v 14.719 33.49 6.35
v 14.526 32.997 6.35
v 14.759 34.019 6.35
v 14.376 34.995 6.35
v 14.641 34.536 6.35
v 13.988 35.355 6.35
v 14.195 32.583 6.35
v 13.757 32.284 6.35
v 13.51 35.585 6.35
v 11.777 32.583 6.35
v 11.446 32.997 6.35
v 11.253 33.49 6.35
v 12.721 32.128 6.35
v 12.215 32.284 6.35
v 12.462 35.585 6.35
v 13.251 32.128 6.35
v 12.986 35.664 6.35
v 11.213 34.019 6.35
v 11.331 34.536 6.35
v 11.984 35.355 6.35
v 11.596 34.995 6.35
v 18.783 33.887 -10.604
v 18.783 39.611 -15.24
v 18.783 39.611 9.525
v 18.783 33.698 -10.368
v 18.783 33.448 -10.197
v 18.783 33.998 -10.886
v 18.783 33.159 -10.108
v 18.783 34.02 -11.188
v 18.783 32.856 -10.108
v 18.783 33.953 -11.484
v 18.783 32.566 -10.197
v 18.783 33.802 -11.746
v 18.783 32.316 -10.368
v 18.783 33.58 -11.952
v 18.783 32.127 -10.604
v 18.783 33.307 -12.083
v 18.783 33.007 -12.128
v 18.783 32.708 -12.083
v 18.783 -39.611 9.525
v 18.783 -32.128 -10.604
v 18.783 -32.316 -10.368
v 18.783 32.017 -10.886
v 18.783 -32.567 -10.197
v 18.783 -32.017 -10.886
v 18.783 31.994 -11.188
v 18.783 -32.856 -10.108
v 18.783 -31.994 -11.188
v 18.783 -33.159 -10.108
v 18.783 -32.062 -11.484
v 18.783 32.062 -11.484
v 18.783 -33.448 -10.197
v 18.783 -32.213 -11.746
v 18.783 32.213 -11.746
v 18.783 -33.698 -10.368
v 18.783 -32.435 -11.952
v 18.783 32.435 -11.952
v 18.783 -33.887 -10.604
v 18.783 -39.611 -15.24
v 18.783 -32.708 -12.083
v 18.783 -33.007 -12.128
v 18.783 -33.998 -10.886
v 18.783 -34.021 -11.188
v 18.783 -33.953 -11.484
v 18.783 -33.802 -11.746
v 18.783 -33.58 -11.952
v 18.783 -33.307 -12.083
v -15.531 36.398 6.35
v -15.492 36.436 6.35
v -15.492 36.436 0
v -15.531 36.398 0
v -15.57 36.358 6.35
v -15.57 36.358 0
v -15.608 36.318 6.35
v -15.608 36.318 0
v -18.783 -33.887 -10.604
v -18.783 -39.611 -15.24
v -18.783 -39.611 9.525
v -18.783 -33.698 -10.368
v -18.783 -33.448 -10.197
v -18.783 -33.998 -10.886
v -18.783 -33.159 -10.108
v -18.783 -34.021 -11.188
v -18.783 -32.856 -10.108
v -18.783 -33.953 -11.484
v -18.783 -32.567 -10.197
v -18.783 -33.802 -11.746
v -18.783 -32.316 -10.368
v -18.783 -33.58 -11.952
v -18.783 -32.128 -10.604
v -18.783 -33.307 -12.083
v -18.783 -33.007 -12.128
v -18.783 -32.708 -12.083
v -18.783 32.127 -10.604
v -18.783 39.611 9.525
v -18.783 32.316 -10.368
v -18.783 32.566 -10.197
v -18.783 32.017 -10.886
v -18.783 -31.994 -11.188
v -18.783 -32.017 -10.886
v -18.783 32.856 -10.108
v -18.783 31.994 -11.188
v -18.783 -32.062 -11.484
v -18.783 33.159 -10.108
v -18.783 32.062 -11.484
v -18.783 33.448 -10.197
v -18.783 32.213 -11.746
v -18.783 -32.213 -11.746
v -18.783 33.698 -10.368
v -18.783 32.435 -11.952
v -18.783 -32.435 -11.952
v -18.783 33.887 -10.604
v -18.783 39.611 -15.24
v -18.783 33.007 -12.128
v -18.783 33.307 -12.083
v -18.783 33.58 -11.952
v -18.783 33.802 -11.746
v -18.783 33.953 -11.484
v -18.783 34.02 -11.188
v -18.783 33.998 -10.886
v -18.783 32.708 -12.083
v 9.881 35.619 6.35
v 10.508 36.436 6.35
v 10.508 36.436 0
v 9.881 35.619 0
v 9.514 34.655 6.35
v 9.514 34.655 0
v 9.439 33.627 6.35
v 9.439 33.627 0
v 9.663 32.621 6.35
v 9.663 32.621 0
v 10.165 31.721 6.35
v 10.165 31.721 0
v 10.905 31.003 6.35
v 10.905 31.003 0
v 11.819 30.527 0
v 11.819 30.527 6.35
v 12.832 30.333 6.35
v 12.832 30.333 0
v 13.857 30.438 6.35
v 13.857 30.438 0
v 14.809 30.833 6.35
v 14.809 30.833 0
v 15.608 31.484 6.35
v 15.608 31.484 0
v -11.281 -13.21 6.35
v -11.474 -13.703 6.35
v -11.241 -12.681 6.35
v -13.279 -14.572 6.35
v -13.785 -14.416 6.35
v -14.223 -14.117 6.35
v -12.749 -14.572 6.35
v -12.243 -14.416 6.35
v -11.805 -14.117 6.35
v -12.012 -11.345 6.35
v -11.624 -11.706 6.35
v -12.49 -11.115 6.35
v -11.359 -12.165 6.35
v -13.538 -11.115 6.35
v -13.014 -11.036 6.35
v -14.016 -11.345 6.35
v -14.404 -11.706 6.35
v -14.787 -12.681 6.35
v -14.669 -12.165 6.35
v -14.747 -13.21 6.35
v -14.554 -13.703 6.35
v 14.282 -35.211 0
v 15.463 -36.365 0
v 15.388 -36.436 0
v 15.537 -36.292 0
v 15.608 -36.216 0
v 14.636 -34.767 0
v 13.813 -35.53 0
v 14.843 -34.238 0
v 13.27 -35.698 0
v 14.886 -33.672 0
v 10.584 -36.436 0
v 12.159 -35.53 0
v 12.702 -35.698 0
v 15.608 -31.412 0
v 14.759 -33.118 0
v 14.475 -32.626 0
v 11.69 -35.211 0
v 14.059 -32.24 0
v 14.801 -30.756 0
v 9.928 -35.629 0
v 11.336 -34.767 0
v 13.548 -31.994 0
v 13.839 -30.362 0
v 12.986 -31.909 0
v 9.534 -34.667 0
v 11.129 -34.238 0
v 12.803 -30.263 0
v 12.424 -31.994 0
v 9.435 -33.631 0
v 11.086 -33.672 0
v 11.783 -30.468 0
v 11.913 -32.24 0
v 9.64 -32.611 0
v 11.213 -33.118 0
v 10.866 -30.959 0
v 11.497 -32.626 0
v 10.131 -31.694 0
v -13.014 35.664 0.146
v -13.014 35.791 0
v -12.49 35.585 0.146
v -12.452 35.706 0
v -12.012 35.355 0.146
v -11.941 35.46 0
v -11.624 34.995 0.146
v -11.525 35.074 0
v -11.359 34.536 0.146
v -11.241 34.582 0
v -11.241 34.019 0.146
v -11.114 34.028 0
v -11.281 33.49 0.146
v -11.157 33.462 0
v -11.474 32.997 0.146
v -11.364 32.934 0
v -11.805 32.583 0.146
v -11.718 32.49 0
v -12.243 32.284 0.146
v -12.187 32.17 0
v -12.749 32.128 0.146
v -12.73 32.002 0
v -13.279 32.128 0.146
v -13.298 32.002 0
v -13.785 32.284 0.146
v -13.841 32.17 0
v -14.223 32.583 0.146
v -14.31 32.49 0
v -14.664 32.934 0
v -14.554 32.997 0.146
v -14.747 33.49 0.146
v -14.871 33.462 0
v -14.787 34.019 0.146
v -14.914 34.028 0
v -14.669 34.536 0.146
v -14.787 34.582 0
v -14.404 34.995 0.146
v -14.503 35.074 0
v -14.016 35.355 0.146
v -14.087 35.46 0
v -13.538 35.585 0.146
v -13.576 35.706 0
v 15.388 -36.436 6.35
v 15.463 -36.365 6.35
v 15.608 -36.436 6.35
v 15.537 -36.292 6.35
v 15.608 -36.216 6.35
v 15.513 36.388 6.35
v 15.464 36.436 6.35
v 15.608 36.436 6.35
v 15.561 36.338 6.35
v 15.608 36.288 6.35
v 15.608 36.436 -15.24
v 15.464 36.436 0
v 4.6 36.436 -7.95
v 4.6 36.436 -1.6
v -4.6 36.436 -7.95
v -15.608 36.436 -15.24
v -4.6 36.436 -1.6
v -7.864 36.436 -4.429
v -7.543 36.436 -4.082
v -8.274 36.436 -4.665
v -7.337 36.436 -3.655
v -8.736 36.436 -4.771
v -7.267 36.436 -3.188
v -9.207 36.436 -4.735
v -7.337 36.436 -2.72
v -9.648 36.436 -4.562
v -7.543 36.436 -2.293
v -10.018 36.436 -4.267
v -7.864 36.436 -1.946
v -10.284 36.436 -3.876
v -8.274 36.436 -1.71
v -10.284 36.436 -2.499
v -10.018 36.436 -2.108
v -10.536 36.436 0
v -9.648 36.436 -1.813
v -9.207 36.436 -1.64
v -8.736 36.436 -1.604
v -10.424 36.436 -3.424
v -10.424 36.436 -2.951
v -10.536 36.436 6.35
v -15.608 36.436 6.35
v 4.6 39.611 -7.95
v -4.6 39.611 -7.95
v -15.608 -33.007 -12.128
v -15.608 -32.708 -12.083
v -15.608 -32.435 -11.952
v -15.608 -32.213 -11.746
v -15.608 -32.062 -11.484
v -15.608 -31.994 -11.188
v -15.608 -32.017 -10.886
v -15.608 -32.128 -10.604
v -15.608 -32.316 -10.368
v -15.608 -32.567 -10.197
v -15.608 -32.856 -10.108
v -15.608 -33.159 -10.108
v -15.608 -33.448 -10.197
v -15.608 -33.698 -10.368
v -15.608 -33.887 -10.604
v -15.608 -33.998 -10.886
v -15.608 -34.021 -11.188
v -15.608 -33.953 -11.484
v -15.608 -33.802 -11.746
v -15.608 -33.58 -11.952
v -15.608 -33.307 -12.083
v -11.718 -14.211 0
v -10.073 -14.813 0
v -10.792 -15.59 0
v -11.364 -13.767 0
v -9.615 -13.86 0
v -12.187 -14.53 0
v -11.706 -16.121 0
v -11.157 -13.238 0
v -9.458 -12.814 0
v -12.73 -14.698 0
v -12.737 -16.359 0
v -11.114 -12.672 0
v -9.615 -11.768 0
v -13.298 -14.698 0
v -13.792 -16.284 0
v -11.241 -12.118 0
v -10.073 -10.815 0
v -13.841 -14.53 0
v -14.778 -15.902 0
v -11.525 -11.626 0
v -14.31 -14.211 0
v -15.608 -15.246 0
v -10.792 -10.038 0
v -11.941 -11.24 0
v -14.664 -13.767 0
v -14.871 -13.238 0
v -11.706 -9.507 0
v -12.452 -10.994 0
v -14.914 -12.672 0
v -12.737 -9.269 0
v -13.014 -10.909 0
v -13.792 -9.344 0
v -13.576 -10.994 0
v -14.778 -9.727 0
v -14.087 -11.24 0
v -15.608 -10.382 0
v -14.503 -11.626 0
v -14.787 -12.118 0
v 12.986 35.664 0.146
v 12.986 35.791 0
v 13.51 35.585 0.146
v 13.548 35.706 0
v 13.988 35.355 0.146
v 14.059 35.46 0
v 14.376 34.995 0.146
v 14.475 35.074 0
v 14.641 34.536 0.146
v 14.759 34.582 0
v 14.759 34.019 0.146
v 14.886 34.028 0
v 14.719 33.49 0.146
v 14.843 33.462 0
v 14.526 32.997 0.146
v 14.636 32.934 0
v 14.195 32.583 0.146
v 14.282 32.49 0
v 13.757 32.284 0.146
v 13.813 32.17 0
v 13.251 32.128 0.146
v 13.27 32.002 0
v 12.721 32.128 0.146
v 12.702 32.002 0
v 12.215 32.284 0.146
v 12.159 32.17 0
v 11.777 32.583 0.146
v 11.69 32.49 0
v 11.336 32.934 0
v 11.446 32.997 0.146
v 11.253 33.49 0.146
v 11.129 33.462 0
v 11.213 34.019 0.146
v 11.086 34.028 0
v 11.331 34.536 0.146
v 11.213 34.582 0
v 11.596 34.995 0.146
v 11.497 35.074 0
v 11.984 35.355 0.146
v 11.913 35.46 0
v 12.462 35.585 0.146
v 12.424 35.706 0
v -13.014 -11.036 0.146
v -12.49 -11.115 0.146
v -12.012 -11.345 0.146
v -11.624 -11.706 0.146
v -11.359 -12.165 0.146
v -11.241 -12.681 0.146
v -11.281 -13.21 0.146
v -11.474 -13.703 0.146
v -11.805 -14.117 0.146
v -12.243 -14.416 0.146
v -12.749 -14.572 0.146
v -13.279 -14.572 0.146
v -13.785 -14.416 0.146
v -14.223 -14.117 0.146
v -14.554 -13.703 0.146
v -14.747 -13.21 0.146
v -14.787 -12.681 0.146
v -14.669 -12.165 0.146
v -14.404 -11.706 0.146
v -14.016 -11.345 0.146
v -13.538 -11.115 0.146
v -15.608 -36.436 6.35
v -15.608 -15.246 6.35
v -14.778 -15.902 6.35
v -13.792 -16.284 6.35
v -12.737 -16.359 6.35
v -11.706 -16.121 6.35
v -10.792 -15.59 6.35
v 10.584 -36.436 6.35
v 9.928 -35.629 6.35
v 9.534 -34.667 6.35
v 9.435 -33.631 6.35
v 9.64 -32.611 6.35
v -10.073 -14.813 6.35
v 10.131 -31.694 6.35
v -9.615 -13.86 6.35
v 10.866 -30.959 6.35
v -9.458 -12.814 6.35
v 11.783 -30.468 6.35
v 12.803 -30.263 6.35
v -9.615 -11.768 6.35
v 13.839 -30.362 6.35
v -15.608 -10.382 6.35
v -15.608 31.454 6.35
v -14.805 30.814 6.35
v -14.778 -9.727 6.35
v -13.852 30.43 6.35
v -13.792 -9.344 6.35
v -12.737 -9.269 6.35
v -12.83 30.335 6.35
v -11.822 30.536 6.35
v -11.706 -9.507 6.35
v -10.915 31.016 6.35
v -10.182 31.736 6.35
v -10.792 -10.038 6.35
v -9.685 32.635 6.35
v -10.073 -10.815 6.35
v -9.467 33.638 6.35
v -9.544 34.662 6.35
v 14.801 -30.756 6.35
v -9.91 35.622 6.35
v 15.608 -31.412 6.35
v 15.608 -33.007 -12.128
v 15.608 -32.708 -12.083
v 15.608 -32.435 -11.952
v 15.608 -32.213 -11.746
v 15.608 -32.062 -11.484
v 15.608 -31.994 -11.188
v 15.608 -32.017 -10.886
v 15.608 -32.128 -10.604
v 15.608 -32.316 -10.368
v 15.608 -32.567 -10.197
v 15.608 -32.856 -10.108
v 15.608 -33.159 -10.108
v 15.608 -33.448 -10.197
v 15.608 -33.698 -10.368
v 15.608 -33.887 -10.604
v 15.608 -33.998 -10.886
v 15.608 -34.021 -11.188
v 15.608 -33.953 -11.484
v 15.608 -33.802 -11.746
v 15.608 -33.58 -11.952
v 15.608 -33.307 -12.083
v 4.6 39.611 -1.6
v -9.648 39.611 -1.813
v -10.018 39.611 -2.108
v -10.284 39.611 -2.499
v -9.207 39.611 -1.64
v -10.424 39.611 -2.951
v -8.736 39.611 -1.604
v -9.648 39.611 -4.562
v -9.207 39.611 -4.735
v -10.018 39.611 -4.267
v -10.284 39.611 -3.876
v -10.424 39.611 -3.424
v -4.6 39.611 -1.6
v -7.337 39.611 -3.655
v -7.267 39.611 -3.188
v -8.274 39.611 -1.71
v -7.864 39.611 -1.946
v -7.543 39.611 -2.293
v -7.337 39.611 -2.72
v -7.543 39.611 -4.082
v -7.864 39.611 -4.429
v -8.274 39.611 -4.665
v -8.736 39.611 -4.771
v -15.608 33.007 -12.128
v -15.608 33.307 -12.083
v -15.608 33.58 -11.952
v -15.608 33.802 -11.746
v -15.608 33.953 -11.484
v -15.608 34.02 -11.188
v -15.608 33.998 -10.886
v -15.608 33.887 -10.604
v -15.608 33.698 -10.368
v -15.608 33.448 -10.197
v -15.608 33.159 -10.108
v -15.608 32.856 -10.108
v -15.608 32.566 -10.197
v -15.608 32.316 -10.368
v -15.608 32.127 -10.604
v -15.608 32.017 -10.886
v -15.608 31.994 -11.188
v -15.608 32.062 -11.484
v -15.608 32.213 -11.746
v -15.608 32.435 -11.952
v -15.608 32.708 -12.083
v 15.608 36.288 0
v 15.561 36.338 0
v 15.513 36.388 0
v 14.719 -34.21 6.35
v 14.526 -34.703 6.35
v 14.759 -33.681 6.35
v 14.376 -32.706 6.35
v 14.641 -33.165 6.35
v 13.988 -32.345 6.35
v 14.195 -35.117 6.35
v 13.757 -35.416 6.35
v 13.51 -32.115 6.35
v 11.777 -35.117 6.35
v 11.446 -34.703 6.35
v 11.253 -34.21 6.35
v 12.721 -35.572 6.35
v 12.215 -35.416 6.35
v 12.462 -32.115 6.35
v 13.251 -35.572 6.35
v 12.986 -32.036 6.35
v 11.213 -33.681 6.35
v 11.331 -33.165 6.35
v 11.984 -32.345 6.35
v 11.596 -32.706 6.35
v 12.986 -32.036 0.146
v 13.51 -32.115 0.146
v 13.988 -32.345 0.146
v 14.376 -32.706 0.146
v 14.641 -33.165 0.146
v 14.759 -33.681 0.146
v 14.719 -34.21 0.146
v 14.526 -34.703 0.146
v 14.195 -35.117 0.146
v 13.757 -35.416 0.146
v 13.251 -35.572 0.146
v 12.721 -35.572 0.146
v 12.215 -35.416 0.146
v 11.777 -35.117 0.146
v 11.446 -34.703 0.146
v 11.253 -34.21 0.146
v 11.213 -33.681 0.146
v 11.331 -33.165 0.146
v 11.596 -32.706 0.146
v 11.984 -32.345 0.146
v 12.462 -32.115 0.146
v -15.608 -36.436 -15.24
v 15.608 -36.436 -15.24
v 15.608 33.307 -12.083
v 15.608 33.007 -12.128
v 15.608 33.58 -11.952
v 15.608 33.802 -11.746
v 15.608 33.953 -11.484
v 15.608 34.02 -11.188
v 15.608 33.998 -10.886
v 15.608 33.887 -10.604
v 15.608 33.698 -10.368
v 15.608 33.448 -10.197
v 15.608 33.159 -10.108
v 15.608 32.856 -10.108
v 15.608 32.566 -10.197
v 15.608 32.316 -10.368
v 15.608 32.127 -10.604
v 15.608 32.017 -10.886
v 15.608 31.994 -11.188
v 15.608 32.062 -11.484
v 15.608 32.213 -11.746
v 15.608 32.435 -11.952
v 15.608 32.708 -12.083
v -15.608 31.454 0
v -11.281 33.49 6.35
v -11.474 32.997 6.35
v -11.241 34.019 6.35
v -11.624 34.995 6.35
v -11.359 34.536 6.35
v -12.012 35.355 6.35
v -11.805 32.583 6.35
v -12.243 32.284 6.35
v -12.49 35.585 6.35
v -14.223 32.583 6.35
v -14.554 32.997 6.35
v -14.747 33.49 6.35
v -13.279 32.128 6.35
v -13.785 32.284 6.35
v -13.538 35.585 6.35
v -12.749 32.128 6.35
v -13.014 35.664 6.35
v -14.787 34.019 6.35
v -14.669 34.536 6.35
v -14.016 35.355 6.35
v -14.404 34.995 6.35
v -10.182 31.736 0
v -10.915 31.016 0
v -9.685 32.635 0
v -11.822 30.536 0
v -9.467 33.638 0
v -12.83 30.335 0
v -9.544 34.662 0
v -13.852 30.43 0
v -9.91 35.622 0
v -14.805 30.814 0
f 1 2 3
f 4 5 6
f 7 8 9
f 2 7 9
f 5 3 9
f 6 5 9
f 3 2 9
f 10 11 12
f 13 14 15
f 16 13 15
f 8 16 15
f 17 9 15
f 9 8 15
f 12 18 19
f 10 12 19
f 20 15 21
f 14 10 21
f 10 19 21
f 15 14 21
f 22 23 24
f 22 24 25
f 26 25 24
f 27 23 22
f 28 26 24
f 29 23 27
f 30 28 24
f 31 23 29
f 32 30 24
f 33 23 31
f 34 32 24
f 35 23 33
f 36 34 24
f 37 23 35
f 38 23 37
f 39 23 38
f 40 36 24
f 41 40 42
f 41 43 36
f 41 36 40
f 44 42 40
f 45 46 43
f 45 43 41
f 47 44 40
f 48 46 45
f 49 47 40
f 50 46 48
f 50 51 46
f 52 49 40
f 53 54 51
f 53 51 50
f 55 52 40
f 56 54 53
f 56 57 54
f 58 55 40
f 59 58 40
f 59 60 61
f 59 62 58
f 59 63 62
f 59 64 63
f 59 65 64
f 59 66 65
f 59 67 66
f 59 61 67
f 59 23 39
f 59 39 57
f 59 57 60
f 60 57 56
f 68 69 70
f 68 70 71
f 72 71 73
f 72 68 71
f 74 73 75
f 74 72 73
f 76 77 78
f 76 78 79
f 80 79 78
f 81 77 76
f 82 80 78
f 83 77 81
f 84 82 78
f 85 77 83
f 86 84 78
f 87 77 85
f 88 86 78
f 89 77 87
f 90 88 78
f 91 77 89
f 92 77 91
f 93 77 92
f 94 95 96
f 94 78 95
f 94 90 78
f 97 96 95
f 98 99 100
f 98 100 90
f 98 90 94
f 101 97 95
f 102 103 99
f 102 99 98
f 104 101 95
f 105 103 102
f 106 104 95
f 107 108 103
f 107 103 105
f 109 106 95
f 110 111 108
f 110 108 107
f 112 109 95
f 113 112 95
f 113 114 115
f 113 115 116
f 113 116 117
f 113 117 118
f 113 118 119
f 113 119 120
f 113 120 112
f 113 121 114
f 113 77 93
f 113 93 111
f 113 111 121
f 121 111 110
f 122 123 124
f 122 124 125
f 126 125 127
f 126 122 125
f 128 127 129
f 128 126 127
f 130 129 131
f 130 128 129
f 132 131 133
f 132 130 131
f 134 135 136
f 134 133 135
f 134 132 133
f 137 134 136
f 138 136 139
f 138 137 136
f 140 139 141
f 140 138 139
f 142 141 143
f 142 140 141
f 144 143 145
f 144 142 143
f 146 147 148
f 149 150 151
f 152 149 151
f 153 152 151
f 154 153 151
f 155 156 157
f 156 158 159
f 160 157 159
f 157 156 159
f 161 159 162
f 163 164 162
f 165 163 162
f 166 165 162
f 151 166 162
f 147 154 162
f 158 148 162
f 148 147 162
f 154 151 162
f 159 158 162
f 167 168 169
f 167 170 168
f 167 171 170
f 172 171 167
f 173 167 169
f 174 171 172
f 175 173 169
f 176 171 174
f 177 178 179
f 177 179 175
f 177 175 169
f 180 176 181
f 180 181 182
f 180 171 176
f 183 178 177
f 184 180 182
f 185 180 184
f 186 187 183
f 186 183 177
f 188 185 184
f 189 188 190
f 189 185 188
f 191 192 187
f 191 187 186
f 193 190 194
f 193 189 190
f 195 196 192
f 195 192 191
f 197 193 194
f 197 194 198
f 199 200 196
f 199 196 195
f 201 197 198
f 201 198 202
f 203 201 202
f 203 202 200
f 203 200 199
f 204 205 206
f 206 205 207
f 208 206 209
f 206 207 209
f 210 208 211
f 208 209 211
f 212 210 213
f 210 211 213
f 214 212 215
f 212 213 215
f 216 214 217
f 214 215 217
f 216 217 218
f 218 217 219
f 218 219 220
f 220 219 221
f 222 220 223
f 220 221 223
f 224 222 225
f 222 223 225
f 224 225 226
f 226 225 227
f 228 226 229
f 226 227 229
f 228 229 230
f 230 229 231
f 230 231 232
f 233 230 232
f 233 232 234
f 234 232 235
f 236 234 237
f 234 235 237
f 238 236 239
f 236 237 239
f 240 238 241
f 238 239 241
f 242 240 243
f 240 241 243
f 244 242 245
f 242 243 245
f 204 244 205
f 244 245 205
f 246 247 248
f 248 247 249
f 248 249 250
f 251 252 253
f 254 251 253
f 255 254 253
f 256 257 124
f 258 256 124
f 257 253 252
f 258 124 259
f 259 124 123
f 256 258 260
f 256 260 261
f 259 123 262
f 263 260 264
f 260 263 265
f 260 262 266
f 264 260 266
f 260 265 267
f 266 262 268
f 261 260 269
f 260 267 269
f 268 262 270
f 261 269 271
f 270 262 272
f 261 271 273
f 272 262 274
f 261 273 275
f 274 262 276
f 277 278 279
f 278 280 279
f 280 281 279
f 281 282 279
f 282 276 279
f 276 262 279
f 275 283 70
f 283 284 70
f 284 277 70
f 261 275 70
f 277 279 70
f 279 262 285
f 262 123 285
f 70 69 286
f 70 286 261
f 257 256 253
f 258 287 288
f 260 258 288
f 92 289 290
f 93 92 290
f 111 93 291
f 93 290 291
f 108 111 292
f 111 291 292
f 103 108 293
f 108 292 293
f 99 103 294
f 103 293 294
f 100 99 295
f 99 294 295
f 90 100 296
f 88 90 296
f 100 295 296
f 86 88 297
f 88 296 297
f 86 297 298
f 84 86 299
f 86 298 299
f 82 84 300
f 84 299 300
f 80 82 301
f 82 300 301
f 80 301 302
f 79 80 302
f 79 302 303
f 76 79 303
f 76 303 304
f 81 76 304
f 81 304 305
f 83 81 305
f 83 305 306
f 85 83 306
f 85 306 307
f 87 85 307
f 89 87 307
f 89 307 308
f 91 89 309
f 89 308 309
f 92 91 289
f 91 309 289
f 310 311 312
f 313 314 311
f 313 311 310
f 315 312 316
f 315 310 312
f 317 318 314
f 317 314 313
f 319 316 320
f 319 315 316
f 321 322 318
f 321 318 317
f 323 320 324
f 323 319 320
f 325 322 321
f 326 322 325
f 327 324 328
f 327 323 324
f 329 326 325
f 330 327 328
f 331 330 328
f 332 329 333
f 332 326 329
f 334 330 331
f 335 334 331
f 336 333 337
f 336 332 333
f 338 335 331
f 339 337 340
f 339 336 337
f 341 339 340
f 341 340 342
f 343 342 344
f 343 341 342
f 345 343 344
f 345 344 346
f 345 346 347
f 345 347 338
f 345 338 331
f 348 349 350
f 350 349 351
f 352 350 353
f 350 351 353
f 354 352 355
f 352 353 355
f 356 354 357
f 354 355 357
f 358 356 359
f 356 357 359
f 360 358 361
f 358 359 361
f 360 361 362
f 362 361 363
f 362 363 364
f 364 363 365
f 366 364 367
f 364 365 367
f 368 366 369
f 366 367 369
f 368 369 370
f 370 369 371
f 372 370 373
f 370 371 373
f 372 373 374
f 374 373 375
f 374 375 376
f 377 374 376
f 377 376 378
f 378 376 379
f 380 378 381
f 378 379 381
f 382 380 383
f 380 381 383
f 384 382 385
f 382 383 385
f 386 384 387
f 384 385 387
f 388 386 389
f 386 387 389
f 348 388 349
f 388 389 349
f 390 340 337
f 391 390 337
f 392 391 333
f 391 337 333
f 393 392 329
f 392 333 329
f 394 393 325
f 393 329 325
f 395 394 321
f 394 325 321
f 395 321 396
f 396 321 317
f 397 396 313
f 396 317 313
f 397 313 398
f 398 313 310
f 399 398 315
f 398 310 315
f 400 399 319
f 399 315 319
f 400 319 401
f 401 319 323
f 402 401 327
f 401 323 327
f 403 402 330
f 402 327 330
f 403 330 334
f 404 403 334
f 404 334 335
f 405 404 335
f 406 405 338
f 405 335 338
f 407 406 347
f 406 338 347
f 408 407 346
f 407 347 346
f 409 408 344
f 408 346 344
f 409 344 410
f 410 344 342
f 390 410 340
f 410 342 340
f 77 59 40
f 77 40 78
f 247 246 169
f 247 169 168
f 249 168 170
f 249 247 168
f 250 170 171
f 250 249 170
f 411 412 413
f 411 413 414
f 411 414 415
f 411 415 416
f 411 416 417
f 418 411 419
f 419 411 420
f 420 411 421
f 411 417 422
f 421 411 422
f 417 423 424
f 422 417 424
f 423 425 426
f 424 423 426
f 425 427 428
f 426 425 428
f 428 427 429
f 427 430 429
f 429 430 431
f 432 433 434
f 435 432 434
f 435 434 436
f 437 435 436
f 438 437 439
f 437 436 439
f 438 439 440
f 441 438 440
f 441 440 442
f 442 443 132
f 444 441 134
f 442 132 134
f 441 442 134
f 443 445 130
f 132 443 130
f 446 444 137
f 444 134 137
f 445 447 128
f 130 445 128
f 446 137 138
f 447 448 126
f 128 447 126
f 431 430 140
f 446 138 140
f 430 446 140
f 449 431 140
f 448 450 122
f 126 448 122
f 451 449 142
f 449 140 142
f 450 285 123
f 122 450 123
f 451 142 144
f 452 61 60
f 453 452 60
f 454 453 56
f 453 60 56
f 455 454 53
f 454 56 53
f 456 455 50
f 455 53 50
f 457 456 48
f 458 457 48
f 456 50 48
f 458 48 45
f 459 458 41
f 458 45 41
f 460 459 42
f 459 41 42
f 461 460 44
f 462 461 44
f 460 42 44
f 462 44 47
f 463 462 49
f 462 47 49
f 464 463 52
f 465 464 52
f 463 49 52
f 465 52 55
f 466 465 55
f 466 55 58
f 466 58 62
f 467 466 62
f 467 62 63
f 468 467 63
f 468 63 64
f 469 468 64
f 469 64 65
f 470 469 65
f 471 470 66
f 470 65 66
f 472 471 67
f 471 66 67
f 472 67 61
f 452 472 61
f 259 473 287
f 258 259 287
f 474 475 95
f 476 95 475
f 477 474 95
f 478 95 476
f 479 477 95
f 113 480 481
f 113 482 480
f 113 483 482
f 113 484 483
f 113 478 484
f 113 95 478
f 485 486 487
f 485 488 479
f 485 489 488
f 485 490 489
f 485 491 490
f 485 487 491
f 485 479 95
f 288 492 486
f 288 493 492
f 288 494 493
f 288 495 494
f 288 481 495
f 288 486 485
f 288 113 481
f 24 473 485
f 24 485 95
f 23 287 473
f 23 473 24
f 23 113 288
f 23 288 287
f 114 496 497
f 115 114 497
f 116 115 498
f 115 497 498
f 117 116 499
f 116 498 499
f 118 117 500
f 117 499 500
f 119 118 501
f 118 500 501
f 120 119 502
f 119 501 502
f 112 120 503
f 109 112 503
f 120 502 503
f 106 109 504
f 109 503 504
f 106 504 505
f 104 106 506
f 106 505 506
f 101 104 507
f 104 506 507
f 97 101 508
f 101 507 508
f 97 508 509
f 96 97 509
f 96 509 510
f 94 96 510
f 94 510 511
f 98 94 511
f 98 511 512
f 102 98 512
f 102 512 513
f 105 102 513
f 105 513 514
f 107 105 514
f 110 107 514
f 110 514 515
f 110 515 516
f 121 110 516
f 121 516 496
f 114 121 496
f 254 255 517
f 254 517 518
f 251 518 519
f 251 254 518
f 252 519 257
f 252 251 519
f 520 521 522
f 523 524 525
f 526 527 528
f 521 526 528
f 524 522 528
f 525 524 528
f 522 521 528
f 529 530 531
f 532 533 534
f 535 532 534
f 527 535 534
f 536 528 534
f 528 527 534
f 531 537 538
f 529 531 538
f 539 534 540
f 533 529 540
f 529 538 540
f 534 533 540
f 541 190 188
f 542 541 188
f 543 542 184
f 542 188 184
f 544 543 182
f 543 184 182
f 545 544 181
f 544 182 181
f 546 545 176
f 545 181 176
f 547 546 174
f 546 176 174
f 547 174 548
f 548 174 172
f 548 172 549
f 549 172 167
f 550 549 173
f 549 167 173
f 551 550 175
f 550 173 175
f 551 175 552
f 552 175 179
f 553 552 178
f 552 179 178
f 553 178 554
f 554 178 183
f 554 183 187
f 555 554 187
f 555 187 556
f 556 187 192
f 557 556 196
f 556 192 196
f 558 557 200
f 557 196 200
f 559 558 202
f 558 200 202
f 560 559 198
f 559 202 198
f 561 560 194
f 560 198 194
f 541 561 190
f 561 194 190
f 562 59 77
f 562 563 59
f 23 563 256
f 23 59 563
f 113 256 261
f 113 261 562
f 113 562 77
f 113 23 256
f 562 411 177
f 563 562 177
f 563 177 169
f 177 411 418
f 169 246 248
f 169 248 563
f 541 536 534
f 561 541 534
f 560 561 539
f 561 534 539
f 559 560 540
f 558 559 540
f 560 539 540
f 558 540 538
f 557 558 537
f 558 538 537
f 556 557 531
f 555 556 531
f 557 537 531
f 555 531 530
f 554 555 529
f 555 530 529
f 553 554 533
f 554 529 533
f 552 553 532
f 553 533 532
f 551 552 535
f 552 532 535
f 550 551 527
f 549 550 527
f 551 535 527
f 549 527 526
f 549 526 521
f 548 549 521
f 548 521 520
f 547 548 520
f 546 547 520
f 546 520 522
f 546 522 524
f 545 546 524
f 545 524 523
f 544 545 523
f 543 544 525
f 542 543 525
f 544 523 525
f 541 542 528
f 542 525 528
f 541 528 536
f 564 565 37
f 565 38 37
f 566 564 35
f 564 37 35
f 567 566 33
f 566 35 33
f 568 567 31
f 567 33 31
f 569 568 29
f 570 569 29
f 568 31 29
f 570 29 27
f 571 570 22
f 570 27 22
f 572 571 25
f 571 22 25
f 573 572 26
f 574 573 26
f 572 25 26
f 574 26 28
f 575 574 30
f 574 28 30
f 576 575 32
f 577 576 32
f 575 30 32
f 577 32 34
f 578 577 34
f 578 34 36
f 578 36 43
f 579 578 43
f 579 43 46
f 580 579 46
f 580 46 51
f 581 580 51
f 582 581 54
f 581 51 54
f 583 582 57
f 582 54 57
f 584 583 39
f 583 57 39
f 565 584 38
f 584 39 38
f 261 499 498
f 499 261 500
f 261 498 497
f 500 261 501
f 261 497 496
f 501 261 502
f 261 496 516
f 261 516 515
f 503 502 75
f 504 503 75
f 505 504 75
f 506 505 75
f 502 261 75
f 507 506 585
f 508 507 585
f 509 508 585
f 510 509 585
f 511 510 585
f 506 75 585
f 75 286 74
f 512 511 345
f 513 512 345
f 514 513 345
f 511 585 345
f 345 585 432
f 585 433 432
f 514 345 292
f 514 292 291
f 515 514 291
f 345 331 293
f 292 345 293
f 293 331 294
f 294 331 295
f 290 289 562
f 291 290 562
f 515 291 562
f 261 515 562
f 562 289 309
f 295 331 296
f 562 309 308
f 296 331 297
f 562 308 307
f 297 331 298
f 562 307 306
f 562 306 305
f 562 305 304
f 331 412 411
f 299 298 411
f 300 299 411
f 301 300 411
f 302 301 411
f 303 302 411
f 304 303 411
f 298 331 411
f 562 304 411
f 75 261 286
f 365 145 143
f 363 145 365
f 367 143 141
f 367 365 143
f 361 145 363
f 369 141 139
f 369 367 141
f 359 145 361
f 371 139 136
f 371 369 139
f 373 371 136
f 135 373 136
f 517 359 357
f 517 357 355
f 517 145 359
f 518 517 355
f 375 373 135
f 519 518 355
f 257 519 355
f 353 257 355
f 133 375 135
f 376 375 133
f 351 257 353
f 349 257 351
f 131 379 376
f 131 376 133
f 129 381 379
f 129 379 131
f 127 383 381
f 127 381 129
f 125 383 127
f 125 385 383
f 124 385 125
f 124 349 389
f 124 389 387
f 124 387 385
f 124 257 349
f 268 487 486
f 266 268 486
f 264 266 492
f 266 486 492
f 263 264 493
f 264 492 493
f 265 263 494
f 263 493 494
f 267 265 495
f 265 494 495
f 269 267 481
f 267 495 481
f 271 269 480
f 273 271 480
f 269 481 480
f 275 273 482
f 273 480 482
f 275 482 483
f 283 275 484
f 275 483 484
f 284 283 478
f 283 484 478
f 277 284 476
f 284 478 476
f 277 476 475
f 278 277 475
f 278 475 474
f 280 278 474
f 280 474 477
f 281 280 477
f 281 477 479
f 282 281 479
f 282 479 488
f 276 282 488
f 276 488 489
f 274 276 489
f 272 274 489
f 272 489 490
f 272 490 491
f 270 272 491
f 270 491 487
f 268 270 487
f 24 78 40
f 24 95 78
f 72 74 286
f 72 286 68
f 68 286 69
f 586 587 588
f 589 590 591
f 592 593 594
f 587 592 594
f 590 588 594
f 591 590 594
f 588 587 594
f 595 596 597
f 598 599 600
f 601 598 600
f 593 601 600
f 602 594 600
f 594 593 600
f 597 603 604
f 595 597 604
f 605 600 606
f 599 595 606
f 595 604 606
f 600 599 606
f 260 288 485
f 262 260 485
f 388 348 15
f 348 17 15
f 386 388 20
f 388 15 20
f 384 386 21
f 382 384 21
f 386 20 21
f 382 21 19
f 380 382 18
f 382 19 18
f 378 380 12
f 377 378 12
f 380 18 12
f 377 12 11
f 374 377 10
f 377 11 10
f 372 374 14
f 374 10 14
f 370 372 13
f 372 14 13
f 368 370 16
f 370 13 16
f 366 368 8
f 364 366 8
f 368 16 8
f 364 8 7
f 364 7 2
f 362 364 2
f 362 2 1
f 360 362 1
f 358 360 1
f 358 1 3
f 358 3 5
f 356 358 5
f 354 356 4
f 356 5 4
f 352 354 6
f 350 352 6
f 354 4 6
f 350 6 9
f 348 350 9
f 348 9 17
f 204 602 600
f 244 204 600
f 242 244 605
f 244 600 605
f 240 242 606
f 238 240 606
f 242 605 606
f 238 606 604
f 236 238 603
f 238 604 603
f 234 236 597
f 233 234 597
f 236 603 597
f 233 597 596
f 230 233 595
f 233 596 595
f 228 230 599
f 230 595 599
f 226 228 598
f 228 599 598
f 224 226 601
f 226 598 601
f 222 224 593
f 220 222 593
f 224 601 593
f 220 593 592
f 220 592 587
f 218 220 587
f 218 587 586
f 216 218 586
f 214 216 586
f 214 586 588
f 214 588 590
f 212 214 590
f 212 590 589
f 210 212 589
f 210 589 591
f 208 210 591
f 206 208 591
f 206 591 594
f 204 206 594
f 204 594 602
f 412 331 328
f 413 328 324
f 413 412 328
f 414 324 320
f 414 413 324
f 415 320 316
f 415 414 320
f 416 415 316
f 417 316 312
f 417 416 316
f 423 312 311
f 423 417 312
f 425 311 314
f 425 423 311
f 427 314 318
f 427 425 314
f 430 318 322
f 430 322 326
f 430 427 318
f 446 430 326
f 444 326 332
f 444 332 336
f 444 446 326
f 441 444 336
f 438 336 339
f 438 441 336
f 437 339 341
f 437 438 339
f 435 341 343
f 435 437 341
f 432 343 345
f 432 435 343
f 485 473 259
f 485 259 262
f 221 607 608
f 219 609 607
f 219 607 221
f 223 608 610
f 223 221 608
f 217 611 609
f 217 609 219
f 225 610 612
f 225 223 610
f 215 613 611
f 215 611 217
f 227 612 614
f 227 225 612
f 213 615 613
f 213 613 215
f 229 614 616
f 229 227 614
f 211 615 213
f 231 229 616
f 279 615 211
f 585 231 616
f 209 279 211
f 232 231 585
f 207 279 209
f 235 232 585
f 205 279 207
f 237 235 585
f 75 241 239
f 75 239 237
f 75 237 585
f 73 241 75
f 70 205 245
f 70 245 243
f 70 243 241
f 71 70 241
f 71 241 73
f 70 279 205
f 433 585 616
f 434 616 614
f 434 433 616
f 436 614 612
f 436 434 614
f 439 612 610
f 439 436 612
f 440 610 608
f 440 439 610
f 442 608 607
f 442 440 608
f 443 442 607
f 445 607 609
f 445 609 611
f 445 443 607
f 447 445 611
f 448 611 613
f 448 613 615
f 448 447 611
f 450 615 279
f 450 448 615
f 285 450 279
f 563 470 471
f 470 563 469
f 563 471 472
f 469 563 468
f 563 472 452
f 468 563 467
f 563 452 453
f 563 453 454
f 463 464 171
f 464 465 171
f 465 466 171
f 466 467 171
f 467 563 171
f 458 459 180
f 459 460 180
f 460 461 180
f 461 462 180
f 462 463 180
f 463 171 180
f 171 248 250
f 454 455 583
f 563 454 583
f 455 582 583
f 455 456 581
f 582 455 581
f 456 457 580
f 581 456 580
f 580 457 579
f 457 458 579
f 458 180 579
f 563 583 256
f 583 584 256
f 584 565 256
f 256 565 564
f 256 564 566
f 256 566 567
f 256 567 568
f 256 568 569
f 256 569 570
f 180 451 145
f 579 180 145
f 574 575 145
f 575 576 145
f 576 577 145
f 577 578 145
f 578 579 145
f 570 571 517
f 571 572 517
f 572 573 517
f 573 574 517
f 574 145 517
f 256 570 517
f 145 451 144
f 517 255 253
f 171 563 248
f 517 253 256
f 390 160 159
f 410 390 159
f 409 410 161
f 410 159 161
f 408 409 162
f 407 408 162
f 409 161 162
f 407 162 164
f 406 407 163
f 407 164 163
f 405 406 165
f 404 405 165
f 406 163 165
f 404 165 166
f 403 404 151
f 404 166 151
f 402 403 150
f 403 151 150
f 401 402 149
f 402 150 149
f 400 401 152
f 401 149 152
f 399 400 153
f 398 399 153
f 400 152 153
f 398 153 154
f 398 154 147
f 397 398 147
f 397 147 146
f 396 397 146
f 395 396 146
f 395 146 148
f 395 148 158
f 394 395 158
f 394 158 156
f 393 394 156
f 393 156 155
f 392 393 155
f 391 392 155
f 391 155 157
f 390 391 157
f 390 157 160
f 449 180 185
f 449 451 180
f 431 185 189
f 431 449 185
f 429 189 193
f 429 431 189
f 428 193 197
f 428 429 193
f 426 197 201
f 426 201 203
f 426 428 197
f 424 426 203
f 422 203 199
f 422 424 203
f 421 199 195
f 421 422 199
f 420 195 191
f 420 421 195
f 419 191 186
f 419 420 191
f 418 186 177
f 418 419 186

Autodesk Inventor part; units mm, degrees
ref_plane "YZ Plane" through (0, 0, 0) normal (1, 0, 0) x (0, 1, 0)
ref_plane "XZ Plane" through (0, 0, 0) normal (0, 1, 0) x (-1, 0, 0)
ref_plane "Work Plane1" through (0, 0, 6.35) normal (0, 0, 1) x (1, 0, 0)
sketch "Sketch1" plane through (0, 0, 6.35) normal (0, 0, 1) x (1, 0, 0)
  line L0 (14.9733, -35.8014) -> (14.9733, 35.8014) projected
  line L1 (14.9733, 35.8014) -> (-14.9733, 35.8014) projected
  line L2 (-14.9733, 35.8014) -> (-14.9733, -35.8014) projected
  line L3 (-14.9733, -35.8014) -> (14.9733, -35.8014) projected
  circle A0 centre (-13.81, -28.5989) radius 0.6 projected
  circle A1 centre (-11.557, -24.257) radius 0.1524 projected
  circle A2 centre (-9.271, -23.749) radius 0.1524 projected
  circle A3 centre (-8.636, -22.606) radius 0.1524 projected
  circle A4 centre (-8.636, -19.939) radius 0.1524 projected
  circle A5 centre (-6.731, -35.3061) radius 0.1524 projected
  circle A6 centre (-5.842, -34.1631) radius 0.1524 projected
  circle A7 centre (-7.239, -31.8771) radius 0.1524 projected
  circle A8 centre (-5.08, -31.7501) radius 0.1524 projected
  circle A9 centre (-5.08, -30.8611) radius 0.1524 projected
  circle A10 centre (-1.016, -32.6391) radius 0.1524 projected
  circle A11 centre (-1.905, -27.9401) radius 0.1524 projected
  circle A12 centre (-4.318, -24.892) radius 0.1524 projected
  circle A13 centre (-5.842, -19.05) radius 0.1524 projected
  circle A14 centre (-5.08, -21.463) radius 0.1524 projected
  circle A15 centre (-5.08, -18.415) radius 0.1524 projected
  circle A16 centre (-4.191, -19.939) radius 0.1524 projected
  circle A17 centre (-4.191, -18.415) radius 0.1524 projected
  circle A18 centre (-11.176, -17.526) radius 0.1525 projected
  circle A19 centre (-13.014, -12.8141) radius 1.016 projected
  circle A20 centre (-7.874, -8.382) radius 1.85 projected
  circle A21 centre (-4.826, -17.526) radius 0.1524 projected
  circle A22 centre (-4.572, -5.715) radius 0.1524 projected
  circle A23 centre (-2.413, -6.35) radius 0.1524 projected
  circle A24 centre (-1.016, -5.715) radius 0.1524 projected
  circle A25 centre (4.953, -31.4961) radius 0.1524 projected
  circle A26 centre (6.35, -30.6071) radius 0.1524 projected
  circle A27 centre (6.19, -28.5989) radius 0.85 projected
  circle A28 centre (0.254, -24.638) radius 0.1524 projected
  circle A29 centre (1.27, -21.082) radius 0.1524 projected
  circle A30 centre (6.604, -26.2891) radius 0.1524 projected
  circle A31 centre (5.461, -21.717) radius 0.1524 projected
  circle A32 centre (8.509, -32.7661) radius 0.1524 projected
  circle A33 centre (8.636, -30.6071) radius 0.1524 projected
  circle A34 centre (12.986, -33.8141) radius 1.016 projected
  circle A35 centre (13.843, -30.0991) radius 0.1524 projected
  circle A36 centre (9.017, -24.892) radius 0.1524 projected
  circle A37 centre (9.779, -22.86) radius 0.1524 projected
  circle A38 centre (7.366, -21.717) radius 0.1524 projected
  circle A39 centre (-0.014, -16.637) radius 0.255 projected
  circle A40 centre (3.429, -7.62) radius 0.1524 projected
  circle A41 centre (10.287, -16.9782) radius 0.1524 projected
  circle A42 centre (10.033, -9.779) radius 0.1524 projected
  circle A43 centre (13.843, -17.526) radius 0.1524 projected
  circle A44 centre (-4.953, 11.303) radius 0.1524 projected
  circle A45 centre (-13.014, 33.886) radius 1.016 projected
  circle A46 centre (-3.8002, 24.494) radius 0.5 projected
  circle A47 centre (-4.4502, 34.2441) radius 0.5 projected
  circle A48 centre (-1.4001, 27.0939) radius 0.45 projected
  circle A49 centre (0, 13.843) radius 0.1524 projected
  circle A50 centre (3.8002, 24.494) radius 0.5 projected
  circle A51 centre (1.4001, 27.0939) radius 0.45 projected
  circle A52 centre (4.4502, 34.2441) radius 0.5 projected
  circle A53 centre (12.986, 33.886) radius 1.016 projected
  line L4 (-18.7833, -39.6114) -> (-18.7833, 39.6114)
  line L5 (-18.7833, 39.6114) -> (18.7833, 39.6114)
  line L6 (18.7833, 39.6114) -> (18.7833, -39.6114)
  line L7 (18.7833, -39.6114) -> (-18.7833, -39.6114)
  point P0 (0, 0)
  dimension "d1" = 3.81
extrude "Extrusion1" add sketch "Sketch1" along normal blind 3.175 contours L3 L2 L1 L0 | A0 | A1 | A2 | A3 | A4 | A5 | A6 | A7 | A8 | A9 | A10 | A11 | A12 | A13 | A14 | A15 | A16 | A17 | A18 | A19 | A20 | A21 | A22 | A23 | A24 | A25 | A26 | A27 | A28 | A29 | A30 | A31 | A32 | A33 | A34 | A35 | A36 | A37 | A38 | A39 | A40 | A41 | A42 | A43 | A44 | A45 | A46 | A47 | A48 | A49 | A50 | A51 | A52 | A53 | L4 L5 L6 L7
sketch "Sketch2" plane through (0, 0, 6.35) normal (0, 0, -1) x (-1, 0, 0)
  circle A0 centre (-12.986, -33.8141) radius 1.016 projected
  circle A1 centre (-12.986, 33.886) radius 1.016 projected
  circle A2 centre (13.014, 33.886) radius 1.016 projected
  circle A3 centre (-12.986, -33.8141) radius 3.556
  circle A4 centre (-12.986, 33.886) radius 3.556
  circle A5 centre (13.014, 33.886) radius 3.556
  line L0 (-12.986, 33.886) -> (13.014, 33.886)
  line L1 (13.014, 33.886) -> (13.014, -33.8141)
  line L2 (13.014, -33.8141) -> (-12.986, -33.8141)
  line L3 (-12.986, -33.8141) -> (-12.986, 33.886)
  circle A6 centre (13.014, -12.8141) radius 1.016
  circle A7 centre (13.014, -12.8141) radius 3.556
  point P0 (0, 0)
  dimension "d4" = 7.112
  dimension "d5" = 7.112
  dimension "d6" = 7.112
  dimension "d32" = 7.112
ref_plane "Work Plane2" through (-14.9733, -35.8014, 0) normal (0, 0, 1) x (1, 0, 0)
extrude "Extrusion2" add sketch "Sketch2" along normal up to surface (6.35 mm away) contours L2 L3 A0 | L2 A3 L3 A0 | A0 L3 A3 L2 | A0 L3 L2 | L3 A1 L0 A4 | A4 L0 A1 L3 | A7 L1 A6 | L1 A6 A7 | L3 L0 A1 | A1 L0 L3 | A6 L1 | L1 A6 | L0 A2 L1 A5 | A5 L1 A2 L0 | L0 L1 A2 | A2 L1 L0
sketch "Sketch3" plane through (12.986, -33.8141, 0) normal (0, 0, -1) x (-1, 0, 0)
  circle A0 centre (0, 67.7) radius 1.016 projected
  circle A1 centre (0, 0) radius 1.016 projected
  circle A2 centre (26, 67.7) radius 1.016 projected
  circle A3 centre (26, 21) radius 3.556 projected
  point P0 (12.986, 33.8141)
hole "Hole1" at (12.986, -33.8141, 0) at (12.986, 33.886, 0) at (-13.014, 33.886, 0) at (-13.014, -12.8141, 0) direction (0, 0, 1) diameter 3.556 depth 6.35 countersink diameter 3.81 countersink angle 82
sketch "Sketch4" plane through (0, 0, 6.35) normal (0, 0, -1) x (-1, 0, 0)
  circle A0 centre (-12.986, 33.886) radius 3.556 projected
  circle A1 centre (13.014, 33.886) radius 3.556 projected
  circle A2 centre (-12.986, -33.8141) radius 3.556 projected
  line L0 (18.7833, -39.6114) -> (-18.7833, -39.6114) projected
  line L1 (18.7833, 39.6114) -> (18.7833, -39.6114) projected
  line L2 (-18.7833, 39.6114) -> (18.7833, 39.6114) projected
  line L3 (-18.7833, -39.6114) -> (-18.7833, 39.6114) projected
  line L4 (-15.6083, 36.4364) -> (15.6083, 36.4364)
  line L5 (15.6083, 36.4364) -> (15.6083, -36.4364)
  line L6 (15.6083, -36.4364) -> (-15.6083, -36.4364)
  line L7 (-15.6083, -36.4364) -> (-15.6083, 36.4364)
  point P0 (0, 0)
  dimension "d17" = 3.175
extrude "Extrusion3" add sketch "Sketch4" along normal blind 21.59 contours L4 A0 | A0 L7 | A1 L4 | L7 A2 | L5 A1 | A2 L6 | L0 L3 L2 L1
sketch "Sketch5" plane through (-18.7833, 39.6114, 9.525) normal (0, 1, 0) x (1, 0, 0)
  line L0 (14.1836, 11.2166) -> (14.1836, 14.2664) projected
  line L1 (23.3831, 14.2664) -> (23.3831, 11.2166) projected
  line L2 (33.7567, 9.525) -> (33.7567, 11.125) projected
  line L3 (33.7567, 11.125) -> (3.81, 11.125) projected
  line L4 (3.81, 9.525) -> (3.81, 11.125) projected
  line L5 (33.7567, 9.525) -> (3.81, 9.525) projected
  line L6 (14.1836, 11.125) -> (23.3831, 11.125)
  line L7 (23.3831, 11.125) -> (23.3831, 17.475)
  line L8 (23.3831, 17.475) -> (14.1836, 17.475)
  line L9 (14.1836, 17.475) -> (14.1836, 11.125)
  point P0 (18.7833, 9.525)
  dimension "d20" = 6.35
extrude "Extrusion4" cut sketch "Sketch5" against normal up to surface (3.175 mm away) contours L0 L9 L8 L7 L1 L3
sketch "Sketch6" plane through (-18.7833, 39.6114, 9.525) normal (0, 1, 0) x (1, 0, 0)
  circle A0 centre (9.9291, 12.7125) radius 1.5875
  line L0 (14.1836, 11.125) -> (14.1836, 17.475) projected
  line L1 (23.3831, 11.125) -> (14.1836, 11.125) projected
  point P0 (18.7833, 9.525)
  dimension "d23" = 4.2545
  dimension "d24" = 3.175
  dimension "d25" = 1.5875
extrude "Extrusion5" cut sketch "Sketch6" against normal up to surface (3.175 mm away)
sketch "Sketch7" plane through (18.7833, -39.6114, 9.525) normal (1, 0, 0) x (0, 0, -1)
  circle A0 centre (20.6375, 72.6187) radius 1.905 projected
  circle A1 centre (20.6375, 6.604) radius 1.778 projected
  circle A2 centre (20.6375, 6.604) radius 1.905 projected
  circle A3 centre (20.6375, 72.6187) radius 1.778 projected
  circle A4 centre (20.6375, 72.6187) radius 1.016
  circle A5 centre (20.6375, 6.604) radius 1.016
  point P0 (9.525, 39.6114)
  dimension "d33" = 2.032
  dimension "d34" = 2.032
extrude "Extrusion6" cut sketch "Sketch7" against normal up to surface (37.5667 mm away) contours A4 | A5
properties part number "SENSOR_BOTTOM" material "PC/ABS Plastic"
